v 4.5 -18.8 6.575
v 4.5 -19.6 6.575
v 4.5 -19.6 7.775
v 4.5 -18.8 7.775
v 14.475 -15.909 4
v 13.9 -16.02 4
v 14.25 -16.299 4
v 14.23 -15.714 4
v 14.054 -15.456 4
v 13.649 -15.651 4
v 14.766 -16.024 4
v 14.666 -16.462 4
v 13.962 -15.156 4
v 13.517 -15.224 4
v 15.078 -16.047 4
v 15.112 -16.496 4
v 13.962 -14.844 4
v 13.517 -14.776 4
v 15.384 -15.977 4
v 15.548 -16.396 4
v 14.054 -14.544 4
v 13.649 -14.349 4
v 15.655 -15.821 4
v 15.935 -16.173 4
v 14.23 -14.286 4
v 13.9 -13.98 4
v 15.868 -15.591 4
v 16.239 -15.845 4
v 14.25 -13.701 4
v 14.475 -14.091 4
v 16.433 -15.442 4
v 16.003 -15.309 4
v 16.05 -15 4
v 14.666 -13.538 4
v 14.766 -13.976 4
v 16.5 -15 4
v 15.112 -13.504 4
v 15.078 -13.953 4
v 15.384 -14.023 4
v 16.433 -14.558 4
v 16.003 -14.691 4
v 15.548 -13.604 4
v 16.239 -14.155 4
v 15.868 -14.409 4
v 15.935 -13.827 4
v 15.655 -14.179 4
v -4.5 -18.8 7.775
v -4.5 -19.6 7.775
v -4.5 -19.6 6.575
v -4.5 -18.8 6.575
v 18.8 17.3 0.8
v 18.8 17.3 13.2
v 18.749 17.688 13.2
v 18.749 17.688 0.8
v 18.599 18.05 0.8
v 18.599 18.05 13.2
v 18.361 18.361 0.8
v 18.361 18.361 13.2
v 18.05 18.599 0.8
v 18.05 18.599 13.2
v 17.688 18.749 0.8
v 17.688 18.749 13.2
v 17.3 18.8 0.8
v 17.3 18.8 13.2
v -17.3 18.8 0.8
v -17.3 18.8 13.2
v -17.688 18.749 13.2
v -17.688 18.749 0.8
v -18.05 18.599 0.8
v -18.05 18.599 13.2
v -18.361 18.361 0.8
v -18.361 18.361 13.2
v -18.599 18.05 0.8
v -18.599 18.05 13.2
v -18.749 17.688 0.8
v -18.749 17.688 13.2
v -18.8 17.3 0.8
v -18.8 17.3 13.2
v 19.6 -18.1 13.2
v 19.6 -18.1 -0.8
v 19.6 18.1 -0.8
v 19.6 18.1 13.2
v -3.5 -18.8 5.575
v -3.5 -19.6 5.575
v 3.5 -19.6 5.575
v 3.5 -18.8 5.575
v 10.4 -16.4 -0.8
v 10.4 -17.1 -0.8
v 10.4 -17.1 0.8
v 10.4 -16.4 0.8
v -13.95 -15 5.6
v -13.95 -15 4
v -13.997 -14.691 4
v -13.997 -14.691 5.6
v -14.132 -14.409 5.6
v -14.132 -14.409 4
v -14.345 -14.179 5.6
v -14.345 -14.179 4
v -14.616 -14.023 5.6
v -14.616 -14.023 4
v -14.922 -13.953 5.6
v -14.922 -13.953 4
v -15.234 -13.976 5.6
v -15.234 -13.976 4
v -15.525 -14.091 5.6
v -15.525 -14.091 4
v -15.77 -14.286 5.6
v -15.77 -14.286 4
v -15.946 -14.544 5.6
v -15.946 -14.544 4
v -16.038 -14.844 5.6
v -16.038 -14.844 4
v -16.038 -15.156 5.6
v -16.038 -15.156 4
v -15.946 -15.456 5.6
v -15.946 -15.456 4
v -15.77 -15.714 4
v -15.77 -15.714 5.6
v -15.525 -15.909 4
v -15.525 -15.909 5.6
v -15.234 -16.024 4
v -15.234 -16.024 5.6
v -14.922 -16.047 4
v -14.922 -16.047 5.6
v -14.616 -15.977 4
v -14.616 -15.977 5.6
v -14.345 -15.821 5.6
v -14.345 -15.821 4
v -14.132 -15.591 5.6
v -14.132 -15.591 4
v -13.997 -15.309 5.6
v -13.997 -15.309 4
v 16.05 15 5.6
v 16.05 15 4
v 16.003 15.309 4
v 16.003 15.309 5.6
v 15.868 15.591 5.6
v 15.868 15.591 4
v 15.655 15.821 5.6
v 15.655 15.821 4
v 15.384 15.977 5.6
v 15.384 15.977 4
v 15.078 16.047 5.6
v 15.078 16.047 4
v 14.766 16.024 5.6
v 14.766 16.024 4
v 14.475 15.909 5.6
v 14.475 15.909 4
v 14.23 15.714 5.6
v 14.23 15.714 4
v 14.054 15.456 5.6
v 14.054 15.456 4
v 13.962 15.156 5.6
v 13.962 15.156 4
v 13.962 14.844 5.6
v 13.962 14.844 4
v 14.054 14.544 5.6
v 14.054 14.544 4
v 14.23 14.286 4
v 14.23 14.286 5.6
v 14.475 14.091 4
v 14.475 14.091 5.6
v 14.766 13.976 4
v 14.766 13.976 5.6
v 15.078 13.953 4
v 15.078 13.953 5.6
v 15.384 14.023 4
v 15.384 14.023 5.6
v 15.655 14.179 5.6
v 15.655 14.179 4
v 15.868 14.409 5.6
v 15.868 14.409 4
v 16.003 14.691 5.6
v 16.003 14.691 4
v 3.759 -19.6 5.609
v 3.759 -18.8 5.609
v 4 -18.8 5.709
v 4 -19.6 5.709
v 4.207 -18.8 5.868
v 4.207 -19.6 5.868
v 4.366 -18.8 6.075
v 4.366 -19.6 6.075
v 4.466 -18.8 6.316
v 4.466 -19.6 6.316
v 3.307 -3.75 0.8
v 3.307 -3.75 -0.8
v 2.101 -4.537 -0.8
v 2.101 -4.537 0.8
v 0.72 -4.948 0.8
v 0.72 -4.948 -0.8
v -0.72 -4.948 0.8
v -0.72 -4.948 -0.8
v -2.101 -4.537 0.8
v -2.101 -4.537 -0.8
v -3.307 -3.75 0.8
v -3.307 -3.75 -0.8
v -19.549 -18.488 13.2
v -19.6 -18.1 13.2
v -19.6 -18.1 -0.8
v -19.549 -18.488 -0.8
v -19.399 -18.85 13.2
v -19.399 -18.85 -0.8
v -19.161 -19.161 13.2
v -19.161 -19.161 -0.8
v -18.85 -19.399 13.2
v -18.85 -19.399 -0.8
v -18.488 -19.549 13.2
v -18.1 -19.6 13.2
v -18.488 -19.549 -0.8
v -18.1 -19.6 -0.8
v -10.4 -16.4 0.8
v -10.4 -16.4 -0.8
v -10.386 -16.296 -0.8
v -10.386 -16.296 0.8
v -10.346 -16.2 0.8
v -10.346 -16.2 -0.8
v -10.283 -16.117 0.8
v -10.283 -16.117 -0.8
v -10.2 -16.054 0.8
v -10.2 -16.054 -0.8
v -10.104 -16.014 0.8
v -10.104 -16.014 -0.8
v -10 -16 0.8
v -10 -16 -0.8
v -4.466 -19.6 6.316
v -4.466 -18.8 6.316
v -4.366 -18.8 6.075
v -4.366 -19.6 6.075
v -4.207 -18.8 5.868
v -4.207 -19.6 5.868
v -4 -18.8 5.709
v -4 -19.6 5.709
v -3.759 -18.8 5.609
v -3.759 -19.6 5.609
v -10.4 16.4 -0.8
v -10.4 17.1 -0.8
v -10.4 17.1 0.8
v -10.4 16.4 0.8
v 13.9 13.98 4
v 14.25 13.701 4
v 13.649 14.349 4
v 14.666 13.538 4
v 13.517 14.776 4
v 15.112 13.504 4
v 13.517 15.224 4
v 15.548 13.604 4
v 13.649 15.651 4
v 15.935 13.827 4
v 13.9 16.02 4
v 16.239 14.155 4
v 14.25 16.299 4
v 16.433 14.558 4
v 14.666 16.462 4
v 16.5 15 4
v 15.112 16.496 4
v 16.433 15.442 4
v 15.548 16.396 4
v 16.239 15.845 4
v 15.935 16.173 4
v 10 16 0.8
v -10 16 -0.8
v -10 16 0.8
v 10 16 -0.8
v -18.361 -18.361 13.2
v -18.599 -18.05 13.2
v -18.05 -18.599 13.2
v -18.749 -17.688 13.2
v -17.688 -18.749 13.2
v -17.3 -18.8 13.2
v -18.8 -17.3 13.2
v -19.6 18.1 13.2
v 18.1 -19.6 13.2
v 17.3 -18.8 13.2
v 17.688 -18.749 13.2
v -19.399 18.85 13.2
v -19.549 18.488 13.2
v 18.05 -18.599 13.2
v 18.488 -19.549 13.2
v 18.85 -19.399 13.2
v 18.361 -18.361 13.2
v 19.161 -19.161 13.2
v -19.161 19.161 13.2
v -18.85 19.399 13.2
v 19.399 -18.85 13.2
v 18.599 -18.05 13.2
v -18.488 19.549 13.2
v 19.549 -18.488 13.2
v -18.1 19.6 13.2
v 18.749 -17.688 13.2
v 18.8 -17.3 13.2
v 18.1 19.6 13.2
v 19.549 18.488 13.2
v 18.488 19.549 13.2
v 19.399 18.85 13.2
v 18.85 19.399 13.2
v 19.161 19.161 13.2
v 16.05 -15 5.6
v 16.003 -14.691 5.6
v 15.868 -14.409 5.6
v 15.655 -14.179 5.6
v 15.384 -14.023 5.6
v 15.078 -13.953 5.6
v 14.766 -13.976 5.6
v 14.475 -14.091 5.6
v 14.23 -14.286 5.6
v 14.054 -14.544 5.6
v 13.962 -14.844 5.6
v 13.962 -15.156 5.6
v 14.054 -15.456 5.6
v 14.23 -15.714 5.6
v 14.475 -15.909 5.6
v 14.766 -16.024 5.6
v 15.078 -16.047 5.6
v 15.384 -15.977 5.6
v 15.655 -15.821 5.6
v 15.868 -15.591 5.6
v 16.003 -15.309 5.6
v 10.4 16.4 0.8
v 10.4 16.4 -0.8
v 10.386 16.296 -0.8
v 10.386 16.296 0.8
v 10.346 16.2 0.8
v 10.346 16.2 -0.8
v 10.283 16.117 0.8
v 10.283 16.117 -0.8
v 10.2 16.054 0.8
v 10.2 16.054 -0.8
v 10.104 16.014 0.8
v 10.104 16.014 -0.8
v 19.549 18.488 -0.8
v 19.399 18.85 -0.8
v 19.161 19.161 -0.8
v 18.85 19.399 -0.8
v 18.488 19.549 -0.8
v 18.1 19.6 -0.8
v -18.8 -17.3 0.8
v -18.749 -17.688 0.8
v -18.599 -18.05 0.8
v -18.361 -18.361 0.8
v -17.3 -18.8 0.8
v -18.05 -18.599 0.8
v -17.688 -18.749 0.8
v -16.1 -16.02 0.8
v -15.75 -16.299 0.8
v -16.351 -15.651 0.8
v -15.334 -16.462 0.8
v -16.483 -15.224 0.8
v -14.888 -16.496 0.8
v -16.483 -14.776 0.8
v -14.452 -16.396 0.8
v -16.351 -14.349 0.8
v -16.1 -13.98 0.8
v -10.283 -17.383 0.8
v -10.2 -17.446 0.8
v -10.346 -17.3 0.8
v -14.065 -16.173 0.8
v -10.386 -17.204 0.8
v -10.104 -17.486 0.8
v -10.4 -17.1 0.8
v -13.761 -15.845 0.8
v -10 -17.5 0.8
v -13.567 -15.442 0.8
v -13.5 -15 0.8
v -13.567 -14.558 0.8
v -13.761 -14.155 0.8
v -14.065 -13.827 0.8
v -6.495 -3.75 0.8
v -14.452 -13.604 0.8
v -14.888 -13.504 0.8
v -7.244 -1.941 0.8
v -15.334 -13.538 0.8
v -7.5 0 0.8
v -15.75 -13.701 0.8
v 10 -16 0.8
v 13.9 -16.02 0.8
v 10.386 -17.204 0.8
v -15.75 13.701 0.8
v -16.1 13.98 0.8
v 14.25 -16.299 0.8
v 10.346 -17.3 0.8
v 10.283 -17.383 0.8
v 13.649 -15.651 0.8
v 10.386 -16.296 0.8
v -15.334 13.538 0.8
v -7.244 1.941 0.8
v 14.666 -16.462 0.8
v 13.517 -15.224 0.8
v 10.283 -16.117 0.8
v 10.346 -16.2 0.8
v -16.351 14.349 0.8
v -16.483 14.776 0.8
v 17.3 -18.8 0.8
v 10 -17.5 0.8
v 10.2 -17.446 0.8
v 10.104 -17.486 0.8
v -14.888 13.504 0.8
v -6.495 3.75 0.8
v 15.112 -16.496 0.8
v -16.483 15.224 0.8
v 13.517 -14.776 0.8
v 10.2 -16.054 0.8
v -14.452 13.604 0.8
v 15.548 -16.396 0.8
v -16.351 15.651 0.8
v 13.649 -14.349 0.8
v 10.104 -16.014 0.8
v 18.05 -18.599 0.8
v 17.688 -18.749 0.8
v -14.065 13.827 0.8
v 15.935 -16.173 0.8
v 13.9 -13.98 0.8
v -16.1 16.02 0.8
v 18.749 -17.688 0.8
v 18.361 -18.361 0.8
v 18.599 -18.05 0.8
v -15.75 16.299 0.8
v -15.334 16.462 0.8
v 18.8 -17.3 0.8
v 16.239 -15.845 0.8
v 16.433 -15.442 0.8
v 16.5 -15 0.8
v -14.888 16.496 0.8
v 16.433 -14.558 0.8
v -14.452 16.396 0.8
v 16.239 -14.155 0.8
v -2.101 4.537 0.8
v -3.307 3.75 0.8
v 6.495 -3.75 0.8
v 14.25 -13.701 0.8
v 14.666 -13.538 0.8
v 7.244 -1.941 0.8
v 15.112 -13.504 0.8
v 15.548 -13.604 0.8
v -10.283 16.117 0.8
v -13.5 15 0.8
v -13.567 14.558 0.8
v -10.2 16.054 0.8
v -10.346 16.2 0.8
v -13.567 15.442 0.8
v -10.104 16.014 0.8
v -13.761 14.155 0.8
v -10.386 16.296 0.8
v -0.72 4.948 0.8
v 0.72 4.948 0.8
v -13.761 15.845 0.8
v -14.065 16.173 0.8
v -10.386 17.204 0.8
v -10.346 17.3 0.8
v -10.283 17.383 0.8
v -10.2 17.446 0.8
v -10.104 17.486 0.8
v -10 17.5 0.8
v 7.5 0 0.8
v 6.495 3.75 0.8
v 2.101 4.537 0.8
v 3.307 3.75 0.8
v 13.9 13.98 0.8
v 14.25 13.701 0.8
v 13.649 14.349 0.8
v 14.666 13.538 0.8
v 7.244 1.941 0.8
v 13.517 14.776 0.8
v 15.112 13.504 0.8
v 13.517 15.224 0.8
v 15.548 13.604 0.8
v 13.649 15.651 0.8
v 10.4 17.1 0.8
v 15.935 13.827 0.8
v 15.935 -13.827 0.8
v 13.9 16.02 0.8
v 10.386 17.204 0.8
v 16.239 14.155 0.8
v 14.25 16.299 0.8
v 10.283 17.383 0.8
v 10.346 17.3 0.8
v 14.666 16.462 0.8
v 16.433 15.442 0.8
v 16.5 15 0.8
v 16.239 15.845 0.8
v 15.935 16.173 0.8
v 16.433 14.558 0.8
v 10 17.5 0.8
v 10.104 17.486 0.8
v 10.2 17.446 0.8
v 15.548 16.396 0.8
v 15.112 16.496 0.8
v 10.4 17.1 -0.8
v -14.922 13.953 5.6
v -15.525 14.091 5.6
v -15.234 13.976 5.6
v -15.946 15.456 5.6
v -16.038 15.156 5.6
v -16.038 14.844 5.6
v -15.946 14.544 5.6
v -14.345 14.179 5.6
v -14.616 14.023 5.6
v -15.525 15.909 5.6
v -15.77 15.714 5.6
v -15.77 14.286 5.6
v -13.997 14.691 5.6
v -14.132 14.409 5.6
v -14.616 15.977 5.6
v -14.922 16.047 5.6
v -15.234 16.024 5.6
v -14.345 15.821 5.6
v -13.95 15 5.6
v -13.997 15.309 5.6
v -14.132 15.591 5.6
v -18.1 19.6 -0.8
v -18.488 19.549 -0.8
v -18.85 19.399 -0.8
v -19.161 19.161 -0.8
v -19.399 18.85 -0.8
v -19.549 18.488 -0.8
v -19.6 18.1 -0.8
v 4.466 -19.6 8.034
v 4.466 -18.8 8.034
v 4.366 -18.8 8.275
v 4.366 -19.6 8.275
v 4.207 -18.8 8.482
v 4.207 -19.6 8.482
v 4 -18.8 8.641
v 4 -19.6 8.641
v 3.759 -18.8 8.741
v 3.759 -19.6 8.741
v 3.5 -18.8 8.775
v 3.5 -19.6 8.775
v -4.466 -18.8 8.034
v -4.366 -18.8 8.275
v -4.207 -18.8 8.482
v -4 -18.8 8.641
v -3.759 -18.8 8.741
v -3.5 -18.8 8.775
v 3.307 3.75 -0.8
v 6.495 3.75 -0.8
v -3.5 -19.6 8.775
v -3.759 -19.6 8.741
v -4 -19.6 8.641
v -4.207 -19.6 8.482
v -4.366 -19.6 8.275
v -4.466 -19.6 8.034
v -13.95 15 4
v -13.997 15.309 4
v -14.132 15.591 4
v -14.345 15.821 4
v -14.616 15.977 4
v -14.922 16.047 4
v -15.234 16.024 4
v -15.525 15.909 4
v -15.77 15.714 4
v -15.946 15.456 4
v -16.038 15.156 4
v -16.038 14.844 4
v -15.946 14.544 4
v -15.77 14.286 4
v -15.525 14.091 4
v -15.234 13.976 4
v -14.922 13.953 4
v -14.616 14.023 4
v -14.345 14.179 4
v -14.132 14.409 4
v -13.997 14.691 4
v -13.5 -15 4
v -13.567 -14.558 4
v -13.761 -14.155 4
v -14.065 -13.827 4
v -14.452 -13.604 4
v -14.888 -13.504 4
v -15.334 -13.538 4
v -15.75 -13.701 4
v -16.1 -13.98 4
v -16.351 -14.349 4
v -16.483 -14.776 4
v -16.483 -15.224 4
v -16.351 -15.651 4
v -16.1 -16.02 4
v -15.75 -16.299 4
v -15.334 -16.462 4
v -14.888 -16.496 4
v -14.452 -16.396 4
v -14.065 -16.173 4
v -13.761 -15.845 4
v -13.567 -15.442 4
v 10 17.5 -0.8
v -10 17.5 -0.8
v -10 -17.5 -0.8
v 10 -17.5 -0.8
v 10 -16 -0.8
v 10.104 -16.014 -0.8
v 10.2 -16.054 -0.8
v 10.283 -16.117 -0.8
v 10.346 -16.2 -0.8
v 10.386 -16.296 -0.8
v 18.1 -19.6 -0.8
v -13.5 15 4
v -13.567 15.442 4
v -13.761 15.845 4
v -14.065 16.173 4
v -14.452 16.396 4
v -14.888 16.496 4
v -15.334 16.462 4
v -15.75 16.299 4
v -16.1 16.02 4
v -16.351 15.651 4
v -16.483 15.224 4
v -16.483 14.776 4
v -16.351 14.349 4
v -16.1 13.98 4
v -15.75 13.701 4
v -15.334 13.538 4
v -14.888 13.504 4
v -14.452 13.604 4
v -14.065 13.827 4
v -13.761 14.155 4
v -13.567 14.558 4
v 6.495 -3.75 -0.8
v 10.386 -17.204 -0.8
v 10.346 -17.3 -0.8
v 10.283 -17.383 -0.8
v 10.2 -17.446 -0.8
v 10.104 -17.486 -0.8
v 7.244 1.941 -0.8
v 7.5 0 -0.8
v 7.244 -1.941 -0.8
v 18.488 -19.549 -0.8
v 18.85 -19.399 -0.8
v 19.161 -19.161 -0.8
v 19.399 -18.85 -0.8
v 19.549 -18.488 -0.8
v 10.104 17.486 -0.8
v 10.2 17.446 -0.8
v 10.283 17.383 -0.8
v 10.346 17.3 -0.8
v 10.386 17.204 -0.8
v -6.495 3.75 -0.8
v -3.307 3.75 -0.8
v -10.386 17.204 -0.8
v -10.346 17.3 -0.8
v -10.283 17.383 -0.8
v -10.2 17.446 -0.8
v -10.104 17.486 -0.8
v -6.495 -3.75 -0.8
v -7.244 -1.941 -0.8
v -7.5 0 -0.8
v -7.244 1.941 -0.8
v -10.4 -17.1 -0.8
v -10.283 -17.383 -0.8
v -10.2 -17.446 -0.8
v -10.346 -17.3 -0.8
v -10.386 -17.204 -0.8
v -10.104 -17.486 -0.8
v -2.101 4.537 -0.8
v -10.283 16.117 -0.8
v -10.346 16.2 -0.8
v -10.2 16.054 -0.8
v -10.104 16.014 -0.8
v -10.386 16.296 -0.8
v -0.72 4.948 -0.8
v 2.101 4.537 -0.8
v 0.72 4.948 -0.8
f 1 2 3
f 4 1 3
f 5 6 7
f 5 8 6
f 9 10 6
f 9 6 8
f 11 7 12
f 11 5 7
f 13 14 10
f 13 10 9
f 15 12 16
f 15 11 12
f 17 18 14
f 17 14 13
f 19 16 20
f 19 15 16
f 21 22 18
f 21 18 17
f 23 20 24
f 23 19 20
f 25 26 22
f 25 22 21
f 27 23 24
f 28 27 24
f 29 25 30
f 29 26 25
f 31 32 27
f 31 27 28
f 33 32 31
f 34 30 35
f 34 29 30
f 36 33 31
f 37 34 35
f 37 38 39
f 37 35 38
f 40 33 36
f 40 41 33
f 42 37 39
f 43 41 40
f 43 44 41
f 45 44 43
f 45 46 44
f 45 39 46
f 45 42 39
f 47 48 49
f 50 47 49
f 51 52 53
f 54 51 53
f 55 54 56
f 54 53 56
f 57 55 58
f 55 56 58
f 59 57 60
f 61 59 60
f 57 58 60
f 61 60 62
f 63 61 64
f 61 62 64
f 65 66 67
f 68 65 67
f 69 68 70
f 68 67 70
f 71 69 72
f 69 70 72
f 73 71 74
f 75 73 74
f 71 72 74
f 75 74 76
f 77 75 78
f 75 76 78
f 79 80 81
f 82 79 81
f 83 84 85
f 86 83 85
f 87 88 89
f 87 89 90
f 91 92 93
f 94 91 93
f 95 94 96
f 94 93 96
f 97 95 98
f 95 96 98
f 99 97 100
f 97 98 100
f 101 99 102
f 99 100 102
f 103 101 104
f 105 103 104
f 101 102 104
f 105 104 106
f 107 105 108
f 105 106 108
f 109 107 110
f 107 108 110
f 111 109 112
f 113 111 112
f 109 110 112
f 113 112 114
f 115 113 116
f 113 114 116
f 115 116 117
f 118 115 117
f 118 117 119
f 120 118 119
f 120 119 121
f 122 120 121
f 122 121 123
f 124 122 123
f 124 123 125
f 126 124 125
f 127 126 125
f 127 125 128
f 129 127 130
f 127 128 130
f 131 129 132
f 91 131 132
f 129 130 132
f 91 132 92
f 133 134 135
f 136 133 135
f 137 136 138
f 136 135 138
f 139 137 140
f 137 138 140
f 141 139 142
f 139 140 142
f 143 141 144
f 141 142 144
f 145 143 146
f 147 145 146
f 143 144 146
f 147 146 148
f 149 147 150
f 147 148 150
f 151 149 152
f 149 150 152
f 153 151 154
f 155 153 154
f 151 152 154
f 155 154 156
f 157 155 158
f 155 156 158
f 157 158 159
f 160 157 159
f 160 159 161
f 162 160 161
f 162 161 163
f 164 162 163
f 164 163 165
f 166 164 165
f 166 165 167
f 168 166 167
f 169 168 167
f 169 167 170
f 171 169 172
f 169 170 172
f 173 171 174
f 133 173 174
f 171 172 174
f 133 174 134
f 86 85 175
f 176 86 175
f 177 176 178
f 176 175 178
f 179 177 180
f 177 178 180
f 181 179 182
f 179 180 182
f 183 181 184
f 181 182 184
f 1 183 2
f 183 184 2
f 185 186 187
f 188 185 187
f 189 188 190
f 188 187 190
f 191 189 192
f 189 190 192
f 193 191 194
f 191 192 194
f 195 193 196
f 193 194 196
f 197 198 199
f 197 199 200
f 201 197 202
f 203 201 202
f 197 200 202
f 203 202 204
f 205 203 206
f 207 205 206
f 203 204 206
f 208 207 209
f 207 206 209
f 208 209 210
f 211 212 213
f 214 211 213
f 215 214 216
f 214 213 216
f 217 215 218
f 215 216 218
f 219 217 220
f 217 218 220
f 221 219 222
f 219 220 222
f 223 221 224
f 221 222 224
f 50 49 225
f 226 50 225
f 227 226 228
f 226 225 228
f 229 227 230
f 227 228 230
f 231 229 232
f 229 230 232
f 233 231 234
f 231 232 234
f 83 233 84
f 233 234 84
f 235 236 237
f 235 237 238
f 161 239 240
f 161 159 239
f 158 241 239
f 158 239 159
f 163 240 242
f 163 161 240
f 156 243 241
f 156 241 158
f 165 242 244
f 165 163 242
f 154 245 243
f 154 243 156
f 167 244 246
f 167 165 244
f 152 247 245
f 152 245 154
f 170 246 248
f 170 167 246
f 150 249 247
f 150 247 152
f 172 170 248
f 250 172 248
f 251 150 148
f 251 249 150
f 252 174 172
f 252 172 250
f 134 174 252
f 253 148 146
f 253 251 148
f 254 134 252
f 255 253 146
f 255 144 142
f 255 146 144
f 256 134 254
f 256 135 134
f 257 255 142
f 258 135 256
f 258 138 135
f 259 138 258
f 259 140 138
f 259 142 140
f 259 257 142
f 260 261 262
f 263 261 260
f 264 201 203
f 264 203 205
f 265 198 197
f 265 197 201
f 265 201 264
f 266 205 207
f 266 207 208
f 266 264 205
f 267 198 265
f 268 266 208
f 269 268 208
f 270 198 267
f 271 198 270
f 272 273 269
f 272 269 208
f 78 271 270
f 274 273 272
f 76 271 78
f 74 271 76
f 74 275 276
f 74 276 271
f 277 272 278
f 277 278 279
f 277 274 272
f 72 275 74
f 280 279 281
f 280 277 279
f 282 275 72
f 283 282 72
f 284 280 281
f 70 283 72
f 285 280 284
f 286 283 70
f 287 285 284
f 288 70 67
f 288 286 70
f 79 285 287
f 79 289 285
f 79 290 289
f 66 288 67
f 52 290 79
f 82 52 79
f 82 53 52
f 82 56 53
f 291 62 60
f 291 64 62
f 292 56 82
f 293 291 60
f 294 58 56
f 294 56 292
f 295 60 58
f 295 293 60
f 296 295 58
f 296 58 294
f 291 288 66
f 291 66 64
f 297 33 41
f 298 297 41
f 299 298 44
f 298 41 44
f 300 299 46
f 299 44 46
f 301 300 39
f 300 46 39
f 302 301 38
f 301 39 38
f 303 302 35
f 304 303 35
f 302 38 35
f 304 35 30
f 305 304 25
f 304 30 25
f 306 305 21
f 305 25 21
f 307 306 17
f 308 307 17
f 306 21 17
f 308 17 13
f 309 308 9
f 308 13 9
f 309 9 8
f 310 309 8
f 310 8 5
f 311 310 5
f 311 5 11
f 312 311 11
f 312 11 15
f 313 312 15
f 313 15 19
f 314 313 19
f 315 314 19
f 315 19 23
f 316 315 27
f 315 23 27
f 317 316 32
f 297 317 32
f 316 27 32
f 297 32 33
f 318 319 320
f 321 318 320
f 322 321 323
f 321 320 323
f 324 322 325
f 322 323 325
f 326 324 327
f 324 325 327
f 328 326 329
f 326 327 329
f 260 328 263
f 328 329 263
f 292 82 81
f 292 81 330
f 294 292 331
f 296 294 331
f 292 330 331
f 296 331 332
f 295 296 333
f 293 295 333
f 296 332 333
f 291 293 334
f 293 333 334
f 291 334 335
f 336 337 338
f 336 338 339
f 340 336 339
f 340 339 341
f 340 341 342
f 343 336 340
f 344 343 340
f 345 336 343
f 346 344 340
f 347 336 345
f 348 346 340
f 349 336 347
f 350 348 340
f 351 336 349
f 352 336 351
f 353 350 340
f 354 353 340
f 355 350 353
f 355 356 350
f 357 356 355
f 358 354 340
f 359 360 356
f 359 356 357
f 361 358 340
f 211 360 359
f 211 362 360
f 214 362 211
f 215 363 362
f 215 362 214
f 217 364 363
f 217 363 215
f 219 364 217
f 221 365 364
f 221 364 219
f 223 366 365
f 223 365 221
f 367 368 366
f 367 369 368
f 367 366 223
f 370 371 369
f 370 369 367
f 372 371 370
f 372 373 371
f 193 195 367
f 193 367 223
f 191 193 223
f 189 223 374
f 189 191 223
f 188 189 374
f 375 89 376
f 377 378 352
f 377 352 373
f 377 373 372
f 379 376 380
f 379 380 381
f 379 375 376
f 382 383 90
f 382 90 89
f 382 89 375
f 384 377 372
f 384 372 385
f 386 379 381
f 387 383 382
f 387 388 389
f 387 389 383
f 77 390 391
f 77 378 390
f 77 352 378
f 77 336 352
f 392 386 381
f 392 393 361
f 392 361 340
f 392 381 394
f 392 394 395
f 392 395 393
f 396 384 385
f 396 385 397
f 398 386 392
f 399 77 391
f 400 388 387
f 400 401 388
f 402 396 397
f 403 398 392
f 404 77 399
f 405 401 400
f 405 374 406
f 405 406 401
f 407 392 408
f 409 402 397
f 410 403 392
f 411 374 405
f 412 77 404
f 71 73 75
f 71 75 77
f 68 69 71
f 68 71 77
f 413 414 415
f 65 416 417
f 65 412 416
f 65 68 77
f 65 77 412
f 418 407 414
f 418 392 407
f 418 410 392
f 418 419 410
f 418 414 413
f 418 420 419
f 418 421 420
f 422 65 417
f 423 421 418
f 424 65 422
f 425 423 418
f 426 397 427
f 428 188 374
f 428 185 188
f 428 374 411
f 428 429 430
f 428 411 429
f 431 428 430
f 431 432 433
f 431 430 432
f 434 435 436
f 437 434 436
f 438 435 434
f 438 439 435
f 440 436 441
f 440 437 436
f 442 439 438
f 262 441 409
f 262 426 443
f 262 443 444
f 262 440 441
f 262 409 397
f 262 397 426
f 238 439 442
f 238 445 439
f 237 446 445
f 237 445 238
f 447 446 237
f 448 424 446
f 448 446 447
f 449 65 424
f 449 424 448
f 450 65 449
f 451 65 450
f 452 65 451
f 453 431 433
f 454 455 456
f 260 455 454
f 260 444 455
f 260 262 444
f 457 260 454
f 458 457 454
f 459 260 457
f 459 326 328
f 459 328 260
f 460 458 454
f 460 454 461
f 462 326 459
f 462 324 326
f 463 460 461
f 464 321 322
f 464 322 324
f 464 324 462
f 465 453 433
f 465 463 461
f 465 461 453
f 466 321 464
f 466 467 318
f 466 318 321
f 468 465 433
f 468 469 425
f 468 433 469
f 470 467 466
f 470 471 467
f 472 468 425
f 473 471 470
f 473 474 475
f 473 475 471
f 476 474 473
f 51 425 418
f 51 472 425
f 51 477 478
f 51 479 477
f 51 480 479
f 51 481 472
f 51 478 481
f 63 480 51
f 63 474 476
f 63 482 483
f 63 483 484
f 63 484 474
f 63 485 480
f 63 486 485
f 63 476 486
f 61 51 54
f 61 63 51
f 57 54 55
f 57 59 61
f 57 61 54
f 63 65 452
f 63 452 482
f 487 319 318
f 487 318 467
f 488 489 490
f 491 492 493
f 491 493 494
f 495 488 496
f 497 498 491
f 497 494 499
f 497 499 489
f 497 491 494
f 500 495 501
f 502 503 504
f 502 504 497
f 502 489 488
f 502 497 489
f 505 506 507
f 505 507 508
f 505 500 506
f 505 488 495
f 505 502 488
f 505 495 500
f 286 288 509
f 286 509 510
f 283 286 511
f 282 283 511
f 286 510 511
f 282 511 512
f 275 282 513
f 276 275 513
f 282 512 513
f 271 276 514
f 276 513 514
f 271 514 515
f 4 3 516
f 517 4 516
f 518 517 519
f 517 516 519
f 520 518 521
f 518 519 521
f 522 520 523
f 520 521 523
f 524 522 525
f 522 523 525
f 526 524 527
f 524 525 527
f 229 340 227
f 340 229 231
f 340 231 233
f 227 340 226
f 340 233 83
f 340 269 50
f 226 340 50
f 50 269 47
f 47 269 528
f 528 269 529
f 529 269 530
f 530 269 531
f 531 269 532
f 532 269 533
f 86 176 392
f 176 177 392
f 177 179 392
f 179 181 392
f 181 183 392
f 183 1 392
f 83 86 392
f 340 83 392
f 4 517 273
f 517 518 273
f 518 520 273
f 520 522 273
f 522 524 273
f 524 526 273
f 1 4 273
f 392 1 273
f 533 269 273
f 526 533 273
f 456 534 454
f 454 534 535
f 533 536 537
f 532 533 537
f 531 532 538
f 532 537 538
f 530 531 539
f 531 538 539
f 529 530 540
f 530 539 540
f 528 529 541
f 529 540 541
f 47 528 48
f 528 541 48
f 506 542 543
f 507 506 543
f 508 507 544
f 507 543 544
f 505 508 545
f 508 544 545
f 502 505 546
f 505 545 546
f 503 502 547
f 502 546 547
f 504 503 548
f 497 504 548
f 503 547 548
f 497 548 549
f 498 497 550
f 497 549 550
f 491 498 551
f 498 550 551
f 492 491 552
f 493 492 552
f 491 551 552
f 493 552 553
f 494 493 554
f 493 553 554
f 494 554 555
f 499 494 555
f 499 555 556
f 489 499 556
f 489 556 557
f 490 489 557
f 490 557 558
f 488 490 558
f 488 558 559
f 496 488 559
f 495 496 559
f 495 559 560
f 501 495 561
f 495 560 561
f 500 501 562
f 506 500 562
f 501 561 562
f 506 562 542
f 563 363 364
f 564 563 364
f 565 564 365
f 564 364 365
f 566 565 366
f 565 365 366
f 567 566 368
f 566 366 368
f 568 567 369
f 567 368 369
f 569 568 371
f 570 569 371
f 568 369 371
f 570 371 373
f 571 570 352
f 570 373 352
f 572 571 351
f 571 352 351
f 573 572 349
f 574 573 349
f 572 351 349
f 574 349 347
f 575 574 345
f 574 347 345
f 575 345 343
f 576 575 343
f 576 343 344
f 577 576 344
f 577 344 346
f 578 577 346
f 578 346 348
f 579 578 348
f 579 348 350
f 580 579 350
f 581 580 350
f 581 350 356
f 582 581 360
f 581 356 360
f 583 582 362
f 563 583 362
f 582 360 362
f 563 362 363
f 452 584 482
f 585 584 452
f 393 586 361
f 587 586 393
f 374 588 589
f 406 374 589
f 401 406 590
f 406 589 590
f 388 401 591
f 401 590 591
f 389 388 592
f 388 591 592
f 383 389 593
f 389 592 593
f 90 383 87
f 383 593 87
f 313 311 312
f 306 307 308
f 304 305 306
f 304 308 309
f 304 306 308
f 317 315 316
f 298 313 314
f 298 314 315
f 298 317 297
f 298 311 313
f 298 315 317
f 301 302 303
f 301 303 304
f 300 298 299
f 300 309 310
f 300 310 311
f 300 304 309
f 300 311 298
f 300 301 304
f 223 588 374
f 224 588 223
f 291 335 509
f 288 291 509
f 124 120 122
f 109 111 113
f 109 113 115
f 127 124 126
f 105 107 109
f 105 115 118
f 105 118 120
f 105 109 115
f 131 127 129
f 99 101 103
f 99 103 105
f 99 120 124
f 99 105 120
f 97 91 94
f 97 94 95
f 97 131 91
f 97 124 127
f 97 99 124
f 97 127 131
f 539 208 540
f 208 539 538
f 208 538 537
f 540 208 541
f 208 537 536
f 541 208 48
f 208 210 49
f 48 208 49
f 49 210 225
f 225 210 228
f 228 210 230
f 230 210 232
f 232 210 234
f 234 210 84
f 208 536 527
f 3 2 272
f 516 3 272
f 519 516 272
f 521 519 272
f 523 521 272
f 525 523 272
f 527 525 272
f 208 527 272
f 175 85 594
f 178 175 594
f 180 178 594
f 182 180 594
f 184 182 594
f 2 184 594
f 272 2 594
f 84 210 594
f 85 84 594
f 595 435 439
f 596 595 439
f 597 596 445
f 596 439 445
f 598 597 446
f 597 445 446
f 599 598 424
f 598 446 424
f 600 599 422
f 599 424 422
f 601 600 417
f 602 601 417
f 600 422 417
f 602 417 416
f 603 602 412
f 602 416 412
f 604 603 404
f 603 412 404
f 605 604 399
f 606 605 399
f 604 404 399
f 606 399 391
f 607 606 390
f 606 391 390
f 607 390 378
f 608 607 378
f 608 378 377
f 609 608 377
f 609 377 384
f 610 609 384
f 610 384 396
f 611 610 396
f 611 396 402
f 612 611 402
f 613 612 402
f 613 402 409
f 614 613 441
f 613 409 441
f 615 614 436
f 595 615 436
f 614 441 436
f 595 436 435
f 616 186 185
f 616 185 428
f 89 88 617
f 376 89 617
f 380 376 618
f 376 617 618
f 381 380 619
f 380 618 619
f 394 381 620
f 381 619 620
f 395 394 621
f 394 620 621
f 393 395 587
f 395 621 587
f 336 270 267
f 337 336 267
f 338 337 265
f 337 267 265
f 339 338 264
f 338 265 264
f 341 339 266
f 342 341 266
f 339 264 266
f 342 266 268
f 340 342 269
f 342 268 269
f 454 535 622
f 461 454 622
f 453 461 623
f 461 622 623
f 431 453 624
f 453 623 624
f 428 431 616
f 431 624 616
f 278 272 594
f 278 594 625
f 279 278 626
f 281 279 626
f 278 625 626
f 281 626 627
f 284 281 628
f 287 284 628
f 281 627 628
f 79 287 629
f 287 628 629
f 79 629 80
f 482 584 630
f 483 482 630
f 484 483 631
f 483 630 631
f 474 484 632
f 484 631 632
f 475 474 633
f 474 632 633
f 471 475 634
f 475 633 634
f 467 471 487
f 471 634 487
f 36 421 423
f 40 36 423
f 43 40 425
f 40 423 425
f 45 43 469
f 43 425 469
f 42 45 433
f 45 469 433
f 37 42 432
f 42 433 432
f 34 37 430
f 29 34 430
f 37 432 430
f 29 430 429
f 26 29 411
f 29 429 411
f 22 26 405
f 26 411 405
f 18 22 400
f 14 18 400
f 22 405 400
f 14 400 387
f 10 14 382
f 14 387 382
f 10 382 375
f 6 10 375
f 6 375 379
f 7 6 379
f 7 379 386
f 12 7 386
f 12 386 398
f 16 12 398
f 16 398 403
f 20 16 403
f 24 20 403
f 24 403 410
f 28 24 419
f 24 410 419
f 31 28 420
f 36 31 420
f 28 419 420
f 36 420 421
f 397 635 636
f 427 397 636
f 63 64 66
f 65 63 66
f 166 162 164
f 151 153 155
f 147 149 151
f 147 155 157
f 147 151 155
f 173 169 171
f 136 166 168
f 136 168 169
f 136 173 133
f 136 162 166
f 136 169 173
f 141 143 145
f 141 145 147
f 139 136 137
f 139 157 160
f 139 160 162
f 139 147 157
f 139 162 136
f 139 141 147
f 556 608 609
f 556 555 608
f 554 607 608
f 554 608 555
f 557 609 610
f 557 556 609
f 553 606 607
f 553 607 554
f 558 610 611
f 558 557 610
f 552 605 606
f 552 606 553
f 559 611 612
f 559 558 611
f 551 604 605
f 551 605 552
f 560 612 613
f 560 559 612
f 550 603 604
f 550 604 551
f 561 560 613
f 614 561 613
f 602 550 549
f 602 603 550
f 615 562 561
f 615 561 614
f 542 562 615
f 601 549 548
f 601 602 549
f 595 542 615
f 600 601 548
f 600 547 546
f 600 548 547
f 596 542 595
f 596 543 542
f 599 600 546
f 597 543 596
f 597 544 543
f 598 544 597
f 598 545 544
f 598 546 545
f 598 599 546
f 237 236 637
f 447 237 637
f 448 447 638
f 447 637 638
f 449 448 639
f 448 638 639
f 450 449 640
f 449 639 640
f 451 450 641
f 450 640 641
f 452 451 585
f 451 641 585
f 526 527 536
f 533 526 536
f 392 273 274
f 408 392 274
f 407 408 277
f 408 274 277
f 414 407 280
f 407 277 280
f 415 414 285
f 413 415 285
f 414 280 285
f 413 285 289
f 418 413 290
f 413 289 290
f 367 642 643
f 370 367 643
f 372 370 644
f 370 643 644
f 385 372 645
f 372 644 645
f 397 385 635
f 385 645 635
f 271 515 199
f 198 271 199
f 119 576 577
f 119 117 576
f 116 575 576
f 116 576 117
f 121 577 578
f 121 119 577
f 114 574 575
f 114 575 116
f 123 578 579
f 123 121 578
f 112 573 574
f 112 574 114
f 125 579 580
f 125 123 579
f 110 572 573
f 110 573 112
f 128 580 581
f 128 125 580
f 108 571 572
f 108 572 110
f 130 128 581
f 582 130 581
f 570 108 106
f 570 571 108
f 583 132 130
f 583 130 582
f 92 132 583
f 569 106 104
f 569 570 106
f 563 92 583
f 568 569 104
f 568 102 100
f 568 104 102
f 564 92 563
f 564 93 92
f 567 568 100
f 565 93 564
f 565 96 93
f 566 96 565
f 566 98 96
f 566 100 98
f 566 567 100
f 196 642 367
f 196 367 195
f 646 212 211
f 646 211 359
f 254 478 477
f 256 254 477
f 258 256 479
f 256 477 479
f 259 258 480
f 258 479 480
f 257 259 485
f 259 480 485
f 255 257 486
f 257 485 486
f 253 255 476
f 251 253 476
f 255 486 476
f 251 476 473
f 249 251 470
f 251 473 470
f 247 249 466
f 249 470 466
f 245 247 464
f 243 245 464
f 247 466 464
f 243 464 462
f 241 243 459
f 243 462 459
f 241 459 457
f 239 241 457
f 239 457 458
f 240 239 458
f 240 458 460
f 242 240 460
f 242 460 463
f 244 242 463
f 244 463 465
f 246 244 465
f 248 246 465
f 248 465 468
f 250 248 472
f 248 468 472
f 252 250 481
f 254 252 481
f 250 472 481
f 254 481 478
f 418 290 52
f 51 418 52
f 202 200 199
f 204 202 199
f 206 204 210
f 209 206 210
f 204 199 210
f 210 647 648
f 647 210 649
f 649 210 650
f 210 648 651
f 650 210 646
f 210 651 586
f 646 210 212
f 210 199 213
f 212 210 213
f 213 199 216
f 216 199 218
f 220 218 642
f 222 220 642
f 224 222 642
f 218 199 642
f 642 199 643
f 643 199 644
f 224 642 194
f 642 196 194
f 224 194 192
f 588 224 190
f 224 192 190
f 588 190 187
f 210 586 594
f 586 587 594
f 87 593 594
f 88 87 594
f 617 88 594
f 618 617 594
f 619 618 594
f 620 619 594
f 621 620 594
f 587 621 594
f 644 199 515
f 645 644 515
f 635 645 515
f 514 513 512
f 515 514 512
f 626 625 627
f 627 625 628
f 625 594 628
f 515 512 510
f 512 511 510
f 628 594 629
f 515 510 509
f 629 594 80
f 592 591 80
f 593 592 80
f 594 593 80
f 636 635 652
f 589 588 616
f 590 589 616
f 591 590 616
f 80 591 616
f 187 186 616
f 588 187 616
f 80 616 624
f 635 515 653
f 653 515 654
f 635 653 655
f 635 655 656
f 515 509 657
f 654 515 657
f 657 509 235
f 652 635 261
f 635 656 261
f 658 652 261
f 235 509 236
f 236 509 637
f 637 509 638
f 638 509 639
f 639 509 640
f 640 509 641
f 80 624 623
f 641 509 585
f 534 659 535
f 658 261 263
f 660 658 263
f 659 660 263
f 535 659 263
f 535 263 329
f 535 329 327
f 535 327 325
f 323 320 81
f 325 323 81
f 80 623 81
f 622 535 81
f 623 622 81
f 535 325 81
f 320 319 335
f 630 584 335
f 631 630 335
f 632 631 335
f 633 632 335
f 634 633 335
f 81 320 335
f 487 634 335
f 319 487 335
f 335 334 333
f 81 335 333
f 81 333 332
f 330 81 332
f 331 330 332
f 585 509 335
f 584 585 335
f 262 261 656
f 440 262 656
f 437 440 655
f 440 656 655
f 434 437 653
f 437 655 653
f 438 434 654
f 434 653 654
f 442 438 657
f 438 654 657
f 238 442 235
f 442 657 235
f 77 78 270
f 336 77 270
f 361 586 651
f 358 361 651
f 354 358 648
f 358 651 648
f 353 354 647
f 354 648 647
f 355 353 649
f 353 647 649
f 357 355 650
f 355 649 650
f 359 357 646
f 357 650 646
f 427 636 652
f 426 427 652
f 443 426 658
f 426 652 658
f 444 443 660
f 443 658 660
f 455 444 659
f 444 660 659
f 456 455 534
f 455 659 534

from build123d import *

# Parameters (mm, degrees)
PAD_DEPTH       = 14
POCKET_DEPTH    = 12.4
SKETCH002_R     = 1.5
PAD001_DEPTH    = 3.2
SKETCH003_R     = 1.05
PAD002_DEPTH    = 1.6
POCKET001_DEPTH = 0.8
POCKET003_DEPTH = 1.6
POCKET008_DEPTH = 1.6


with BuildPart() as part:
    # Sketch → Pad (new body)
    with BuildSketch(Plane.XY):
        with BuildLine():
            Line((-19.6, 18.1), (-19.6, -18.1))
            ThreePointArc((-19.6, -18.1), (-19.16066, -19.16066), (-18.1, -19.6))
            Line((-18.1, -19.6), (18.1, -19.6))
            ThreePointArc((18.1, -19.6), (19.16066, -19.16066), (19.6, -18.1))
            Line((19.6, -18.1), (19.6, 18.1))
            ThreePointArc((19.6, 18.1), (19.16066, 19.16066), (18.1, 19.6))
            Line((18.1, 19.6), (-18.1, 19.6))
            ThreePointArc((-18.1, 19.6), (-19.16066, 19.16066), (-19.6, 18.1))
        make_face()
    extrude(amount=PAD_DEPTH)

    # Sketch001 (on Face10 of Pad) → Pocket (cut)
    with BuildSketch(Plane.XY.offset(14)):
        with BuildLine():
            Line((-18.8, 17.3), (-18.8, -17.3))
            ThreePointArc((-18.8, -17.3), (-18.36066, -18.36066), (-17.3, -18.8))
            Line((-17.3, -18.8), (17.3, -18.8))
            ThreePointArc((17.3, -18.8), (18.36066, -18.36066), (18.8, -17.3))
            Line((18.8, -17.3), (18.8, 17.3))
            ThreePointArc((18.8, 17.3), (18.36066, 18.36066), (17.3, 18.8))
            Line((17.3, 18.8), (-17.3, 18.8))
            ThreePointArc((-17.3, 18.8), (-18.36066, 18.36066), (-18.8, 17.3))
        make_face()
    extrude(amount=-POCKET_DEPTH, mode=Mode.SUBTRACT)

    # Sketch002 (on Face19 of Pocket) → Pad001 (join)
    with BuildSketch(Plane.XY.offset(1.6)):
        with Locations((-15, 15)):
            Circle(SKETCH002_R)
        with Locations((15, 15)):
            Circle(SKETCH002_R)
        with Locations((-15, -15)):
            Circle(SKETCH002_R)
        with Locations((15, -15)):
            Circle(SKETCH002_R)
    extrude(amount=PAD001_DEPTH)

    # Sketch003 (on Face27 of Pad001) → Pad002 (join)
    with BuildSketch(Plane.XY.offset(4.8)):
        with Locations((-15, 15)):
            Circle(SKETCH003_R)
        with Locations((15, 15)):
            Circle(SKETCH003_R)
        with Locations((-15, -15)):
            Circle(SKETCH003_R)
        with Locations((15, -15)):
            Circle(SKETCH003_R)
    extrude(amount=PAD002_DEPTH)

    # Sketch004 (on Face7 of Pad002) → Pocket001 (cut)
    with BuildSketch(Plane.XZ.offset(19.6)):
        with BuildLine():
            Line((-4.5, 8.575), (-4.5, 7.375))
            ThreePointArc((-4.5, 7.375), (-4.207107, 6.667893), (-3.5, 6.375))
            Line((-3.5, 6.375), (3.5, 6.375))
            ThreePointArc((3.5, 6.375), (4.207107, 6.667893), (4.5, 7.375))
            Line((4.5, 7.375), (4.5, 8.575))
            ThreePointArc((4.5, 8.575), (4.207107, 9.282107), (3.5, 9.575))
            Line((3.5, 9.575), (-3.5, 9.575))
            ThreePointArc((-3.5, 9.575), (-4.207107, 9.282107), (-4.5, 8.575))
        make_face()
    extrude(amount=-POCKET001_DEPTH, mode=Mode.SUBTRACT)

    # Sketch009 (on Face4 of Pocket001) → Pocket003 (cut)
    with BuildSketch(Plane(origin=(0, 0, 0), x_dir=(1, 0, 0), z_dir=(0, 0, -1))):
        with BuildLine():
            Line((-6.495191, 3.75), (-3.307189, 3.75))
            ThreePointArc((3.307189, 3.75), (0, 5), (-3.307189, 3.75))
            Line((3.307189, 3.75), (6.495191, 3.75))
            ThreePointArc((6.495191, -3.75), (7.5, 0), (6.495191, 3.75))
            Line((3.307189, -3.75), (6.495191, -3.75))
            ThreePointArc((-3.307189, -3.75), (0, -5), (3.307189, -3.75))
            Line((-6.495191, -3.75), (-3.307189, -3.75))
            ThreePointArc((-6.495191, 3.75), (-7.5, 0), (-6.495191, -3.75))
        make_face()
    extrude(amount=-POCKET003_DEPTH, mode=Mode.SUBTRACT)

    # Sketch029 (on Face4 of Pocket003) → Pocket008 (cut)
    with BuildSketch(Plane(origin=(0, 0, 0), x_dir=(1, 0, 0), z_dir=(0, 0, -1))):
        with BuildLine():
            Line((-10, 17.5), (10, 17.5))
            ThreePointArc((10.4, 17.1), (10.282843, 17.382843), (10, 17.5))
            Line((10.4, 17.1), (10.4, 16.4))
            ThreePointArc((10, 16), (10.282843, 16.117157), (10.4, 16.4))
            Line((10, 16), (-10, 16))
            ThreePointArc((-10.4, 16.4), (-10.282843, 16.117157), (-10, 16))
            Line((-10.4, 16.4), (-10.4, 17.1))
            ThreePointArc((-10, 17.5), (-10.282843, 17.382843), (-10.4, 17.1))
        make_face()
        with BuildLine():
            Line((-10, -16), (10, -16))
            ThreePointArc((10.4, -16.4), (10.282843, -16.117157), (10, -16))
            Line((10.4, -16.4), (10.4, -17.1))
            ThreePointArc((10, -17.5), (10.282843, -17.382843), (10.4, -17.1))
            Line((10, -17.5), (-10, -17.5))
            ThreePointArc((-10.4, -17.1), (-10.282843, -17.382843), (-10, -17.5))
            Line((-10.4, -17.1), (-10.4, -16.4))
            ThreePointArc((-10, -16), (-10.282843, -16.117157), (-10.4, -16.4))
        make_face()
    extrude(amount=-POCKET008_DEPTH, mode=Mode.SUBTRACT)


with BuildPart() as part_1:
    # Body placement: moved
    add(part.part.moved(Location((0, 0, -0.8))))


solid = part_1.part
